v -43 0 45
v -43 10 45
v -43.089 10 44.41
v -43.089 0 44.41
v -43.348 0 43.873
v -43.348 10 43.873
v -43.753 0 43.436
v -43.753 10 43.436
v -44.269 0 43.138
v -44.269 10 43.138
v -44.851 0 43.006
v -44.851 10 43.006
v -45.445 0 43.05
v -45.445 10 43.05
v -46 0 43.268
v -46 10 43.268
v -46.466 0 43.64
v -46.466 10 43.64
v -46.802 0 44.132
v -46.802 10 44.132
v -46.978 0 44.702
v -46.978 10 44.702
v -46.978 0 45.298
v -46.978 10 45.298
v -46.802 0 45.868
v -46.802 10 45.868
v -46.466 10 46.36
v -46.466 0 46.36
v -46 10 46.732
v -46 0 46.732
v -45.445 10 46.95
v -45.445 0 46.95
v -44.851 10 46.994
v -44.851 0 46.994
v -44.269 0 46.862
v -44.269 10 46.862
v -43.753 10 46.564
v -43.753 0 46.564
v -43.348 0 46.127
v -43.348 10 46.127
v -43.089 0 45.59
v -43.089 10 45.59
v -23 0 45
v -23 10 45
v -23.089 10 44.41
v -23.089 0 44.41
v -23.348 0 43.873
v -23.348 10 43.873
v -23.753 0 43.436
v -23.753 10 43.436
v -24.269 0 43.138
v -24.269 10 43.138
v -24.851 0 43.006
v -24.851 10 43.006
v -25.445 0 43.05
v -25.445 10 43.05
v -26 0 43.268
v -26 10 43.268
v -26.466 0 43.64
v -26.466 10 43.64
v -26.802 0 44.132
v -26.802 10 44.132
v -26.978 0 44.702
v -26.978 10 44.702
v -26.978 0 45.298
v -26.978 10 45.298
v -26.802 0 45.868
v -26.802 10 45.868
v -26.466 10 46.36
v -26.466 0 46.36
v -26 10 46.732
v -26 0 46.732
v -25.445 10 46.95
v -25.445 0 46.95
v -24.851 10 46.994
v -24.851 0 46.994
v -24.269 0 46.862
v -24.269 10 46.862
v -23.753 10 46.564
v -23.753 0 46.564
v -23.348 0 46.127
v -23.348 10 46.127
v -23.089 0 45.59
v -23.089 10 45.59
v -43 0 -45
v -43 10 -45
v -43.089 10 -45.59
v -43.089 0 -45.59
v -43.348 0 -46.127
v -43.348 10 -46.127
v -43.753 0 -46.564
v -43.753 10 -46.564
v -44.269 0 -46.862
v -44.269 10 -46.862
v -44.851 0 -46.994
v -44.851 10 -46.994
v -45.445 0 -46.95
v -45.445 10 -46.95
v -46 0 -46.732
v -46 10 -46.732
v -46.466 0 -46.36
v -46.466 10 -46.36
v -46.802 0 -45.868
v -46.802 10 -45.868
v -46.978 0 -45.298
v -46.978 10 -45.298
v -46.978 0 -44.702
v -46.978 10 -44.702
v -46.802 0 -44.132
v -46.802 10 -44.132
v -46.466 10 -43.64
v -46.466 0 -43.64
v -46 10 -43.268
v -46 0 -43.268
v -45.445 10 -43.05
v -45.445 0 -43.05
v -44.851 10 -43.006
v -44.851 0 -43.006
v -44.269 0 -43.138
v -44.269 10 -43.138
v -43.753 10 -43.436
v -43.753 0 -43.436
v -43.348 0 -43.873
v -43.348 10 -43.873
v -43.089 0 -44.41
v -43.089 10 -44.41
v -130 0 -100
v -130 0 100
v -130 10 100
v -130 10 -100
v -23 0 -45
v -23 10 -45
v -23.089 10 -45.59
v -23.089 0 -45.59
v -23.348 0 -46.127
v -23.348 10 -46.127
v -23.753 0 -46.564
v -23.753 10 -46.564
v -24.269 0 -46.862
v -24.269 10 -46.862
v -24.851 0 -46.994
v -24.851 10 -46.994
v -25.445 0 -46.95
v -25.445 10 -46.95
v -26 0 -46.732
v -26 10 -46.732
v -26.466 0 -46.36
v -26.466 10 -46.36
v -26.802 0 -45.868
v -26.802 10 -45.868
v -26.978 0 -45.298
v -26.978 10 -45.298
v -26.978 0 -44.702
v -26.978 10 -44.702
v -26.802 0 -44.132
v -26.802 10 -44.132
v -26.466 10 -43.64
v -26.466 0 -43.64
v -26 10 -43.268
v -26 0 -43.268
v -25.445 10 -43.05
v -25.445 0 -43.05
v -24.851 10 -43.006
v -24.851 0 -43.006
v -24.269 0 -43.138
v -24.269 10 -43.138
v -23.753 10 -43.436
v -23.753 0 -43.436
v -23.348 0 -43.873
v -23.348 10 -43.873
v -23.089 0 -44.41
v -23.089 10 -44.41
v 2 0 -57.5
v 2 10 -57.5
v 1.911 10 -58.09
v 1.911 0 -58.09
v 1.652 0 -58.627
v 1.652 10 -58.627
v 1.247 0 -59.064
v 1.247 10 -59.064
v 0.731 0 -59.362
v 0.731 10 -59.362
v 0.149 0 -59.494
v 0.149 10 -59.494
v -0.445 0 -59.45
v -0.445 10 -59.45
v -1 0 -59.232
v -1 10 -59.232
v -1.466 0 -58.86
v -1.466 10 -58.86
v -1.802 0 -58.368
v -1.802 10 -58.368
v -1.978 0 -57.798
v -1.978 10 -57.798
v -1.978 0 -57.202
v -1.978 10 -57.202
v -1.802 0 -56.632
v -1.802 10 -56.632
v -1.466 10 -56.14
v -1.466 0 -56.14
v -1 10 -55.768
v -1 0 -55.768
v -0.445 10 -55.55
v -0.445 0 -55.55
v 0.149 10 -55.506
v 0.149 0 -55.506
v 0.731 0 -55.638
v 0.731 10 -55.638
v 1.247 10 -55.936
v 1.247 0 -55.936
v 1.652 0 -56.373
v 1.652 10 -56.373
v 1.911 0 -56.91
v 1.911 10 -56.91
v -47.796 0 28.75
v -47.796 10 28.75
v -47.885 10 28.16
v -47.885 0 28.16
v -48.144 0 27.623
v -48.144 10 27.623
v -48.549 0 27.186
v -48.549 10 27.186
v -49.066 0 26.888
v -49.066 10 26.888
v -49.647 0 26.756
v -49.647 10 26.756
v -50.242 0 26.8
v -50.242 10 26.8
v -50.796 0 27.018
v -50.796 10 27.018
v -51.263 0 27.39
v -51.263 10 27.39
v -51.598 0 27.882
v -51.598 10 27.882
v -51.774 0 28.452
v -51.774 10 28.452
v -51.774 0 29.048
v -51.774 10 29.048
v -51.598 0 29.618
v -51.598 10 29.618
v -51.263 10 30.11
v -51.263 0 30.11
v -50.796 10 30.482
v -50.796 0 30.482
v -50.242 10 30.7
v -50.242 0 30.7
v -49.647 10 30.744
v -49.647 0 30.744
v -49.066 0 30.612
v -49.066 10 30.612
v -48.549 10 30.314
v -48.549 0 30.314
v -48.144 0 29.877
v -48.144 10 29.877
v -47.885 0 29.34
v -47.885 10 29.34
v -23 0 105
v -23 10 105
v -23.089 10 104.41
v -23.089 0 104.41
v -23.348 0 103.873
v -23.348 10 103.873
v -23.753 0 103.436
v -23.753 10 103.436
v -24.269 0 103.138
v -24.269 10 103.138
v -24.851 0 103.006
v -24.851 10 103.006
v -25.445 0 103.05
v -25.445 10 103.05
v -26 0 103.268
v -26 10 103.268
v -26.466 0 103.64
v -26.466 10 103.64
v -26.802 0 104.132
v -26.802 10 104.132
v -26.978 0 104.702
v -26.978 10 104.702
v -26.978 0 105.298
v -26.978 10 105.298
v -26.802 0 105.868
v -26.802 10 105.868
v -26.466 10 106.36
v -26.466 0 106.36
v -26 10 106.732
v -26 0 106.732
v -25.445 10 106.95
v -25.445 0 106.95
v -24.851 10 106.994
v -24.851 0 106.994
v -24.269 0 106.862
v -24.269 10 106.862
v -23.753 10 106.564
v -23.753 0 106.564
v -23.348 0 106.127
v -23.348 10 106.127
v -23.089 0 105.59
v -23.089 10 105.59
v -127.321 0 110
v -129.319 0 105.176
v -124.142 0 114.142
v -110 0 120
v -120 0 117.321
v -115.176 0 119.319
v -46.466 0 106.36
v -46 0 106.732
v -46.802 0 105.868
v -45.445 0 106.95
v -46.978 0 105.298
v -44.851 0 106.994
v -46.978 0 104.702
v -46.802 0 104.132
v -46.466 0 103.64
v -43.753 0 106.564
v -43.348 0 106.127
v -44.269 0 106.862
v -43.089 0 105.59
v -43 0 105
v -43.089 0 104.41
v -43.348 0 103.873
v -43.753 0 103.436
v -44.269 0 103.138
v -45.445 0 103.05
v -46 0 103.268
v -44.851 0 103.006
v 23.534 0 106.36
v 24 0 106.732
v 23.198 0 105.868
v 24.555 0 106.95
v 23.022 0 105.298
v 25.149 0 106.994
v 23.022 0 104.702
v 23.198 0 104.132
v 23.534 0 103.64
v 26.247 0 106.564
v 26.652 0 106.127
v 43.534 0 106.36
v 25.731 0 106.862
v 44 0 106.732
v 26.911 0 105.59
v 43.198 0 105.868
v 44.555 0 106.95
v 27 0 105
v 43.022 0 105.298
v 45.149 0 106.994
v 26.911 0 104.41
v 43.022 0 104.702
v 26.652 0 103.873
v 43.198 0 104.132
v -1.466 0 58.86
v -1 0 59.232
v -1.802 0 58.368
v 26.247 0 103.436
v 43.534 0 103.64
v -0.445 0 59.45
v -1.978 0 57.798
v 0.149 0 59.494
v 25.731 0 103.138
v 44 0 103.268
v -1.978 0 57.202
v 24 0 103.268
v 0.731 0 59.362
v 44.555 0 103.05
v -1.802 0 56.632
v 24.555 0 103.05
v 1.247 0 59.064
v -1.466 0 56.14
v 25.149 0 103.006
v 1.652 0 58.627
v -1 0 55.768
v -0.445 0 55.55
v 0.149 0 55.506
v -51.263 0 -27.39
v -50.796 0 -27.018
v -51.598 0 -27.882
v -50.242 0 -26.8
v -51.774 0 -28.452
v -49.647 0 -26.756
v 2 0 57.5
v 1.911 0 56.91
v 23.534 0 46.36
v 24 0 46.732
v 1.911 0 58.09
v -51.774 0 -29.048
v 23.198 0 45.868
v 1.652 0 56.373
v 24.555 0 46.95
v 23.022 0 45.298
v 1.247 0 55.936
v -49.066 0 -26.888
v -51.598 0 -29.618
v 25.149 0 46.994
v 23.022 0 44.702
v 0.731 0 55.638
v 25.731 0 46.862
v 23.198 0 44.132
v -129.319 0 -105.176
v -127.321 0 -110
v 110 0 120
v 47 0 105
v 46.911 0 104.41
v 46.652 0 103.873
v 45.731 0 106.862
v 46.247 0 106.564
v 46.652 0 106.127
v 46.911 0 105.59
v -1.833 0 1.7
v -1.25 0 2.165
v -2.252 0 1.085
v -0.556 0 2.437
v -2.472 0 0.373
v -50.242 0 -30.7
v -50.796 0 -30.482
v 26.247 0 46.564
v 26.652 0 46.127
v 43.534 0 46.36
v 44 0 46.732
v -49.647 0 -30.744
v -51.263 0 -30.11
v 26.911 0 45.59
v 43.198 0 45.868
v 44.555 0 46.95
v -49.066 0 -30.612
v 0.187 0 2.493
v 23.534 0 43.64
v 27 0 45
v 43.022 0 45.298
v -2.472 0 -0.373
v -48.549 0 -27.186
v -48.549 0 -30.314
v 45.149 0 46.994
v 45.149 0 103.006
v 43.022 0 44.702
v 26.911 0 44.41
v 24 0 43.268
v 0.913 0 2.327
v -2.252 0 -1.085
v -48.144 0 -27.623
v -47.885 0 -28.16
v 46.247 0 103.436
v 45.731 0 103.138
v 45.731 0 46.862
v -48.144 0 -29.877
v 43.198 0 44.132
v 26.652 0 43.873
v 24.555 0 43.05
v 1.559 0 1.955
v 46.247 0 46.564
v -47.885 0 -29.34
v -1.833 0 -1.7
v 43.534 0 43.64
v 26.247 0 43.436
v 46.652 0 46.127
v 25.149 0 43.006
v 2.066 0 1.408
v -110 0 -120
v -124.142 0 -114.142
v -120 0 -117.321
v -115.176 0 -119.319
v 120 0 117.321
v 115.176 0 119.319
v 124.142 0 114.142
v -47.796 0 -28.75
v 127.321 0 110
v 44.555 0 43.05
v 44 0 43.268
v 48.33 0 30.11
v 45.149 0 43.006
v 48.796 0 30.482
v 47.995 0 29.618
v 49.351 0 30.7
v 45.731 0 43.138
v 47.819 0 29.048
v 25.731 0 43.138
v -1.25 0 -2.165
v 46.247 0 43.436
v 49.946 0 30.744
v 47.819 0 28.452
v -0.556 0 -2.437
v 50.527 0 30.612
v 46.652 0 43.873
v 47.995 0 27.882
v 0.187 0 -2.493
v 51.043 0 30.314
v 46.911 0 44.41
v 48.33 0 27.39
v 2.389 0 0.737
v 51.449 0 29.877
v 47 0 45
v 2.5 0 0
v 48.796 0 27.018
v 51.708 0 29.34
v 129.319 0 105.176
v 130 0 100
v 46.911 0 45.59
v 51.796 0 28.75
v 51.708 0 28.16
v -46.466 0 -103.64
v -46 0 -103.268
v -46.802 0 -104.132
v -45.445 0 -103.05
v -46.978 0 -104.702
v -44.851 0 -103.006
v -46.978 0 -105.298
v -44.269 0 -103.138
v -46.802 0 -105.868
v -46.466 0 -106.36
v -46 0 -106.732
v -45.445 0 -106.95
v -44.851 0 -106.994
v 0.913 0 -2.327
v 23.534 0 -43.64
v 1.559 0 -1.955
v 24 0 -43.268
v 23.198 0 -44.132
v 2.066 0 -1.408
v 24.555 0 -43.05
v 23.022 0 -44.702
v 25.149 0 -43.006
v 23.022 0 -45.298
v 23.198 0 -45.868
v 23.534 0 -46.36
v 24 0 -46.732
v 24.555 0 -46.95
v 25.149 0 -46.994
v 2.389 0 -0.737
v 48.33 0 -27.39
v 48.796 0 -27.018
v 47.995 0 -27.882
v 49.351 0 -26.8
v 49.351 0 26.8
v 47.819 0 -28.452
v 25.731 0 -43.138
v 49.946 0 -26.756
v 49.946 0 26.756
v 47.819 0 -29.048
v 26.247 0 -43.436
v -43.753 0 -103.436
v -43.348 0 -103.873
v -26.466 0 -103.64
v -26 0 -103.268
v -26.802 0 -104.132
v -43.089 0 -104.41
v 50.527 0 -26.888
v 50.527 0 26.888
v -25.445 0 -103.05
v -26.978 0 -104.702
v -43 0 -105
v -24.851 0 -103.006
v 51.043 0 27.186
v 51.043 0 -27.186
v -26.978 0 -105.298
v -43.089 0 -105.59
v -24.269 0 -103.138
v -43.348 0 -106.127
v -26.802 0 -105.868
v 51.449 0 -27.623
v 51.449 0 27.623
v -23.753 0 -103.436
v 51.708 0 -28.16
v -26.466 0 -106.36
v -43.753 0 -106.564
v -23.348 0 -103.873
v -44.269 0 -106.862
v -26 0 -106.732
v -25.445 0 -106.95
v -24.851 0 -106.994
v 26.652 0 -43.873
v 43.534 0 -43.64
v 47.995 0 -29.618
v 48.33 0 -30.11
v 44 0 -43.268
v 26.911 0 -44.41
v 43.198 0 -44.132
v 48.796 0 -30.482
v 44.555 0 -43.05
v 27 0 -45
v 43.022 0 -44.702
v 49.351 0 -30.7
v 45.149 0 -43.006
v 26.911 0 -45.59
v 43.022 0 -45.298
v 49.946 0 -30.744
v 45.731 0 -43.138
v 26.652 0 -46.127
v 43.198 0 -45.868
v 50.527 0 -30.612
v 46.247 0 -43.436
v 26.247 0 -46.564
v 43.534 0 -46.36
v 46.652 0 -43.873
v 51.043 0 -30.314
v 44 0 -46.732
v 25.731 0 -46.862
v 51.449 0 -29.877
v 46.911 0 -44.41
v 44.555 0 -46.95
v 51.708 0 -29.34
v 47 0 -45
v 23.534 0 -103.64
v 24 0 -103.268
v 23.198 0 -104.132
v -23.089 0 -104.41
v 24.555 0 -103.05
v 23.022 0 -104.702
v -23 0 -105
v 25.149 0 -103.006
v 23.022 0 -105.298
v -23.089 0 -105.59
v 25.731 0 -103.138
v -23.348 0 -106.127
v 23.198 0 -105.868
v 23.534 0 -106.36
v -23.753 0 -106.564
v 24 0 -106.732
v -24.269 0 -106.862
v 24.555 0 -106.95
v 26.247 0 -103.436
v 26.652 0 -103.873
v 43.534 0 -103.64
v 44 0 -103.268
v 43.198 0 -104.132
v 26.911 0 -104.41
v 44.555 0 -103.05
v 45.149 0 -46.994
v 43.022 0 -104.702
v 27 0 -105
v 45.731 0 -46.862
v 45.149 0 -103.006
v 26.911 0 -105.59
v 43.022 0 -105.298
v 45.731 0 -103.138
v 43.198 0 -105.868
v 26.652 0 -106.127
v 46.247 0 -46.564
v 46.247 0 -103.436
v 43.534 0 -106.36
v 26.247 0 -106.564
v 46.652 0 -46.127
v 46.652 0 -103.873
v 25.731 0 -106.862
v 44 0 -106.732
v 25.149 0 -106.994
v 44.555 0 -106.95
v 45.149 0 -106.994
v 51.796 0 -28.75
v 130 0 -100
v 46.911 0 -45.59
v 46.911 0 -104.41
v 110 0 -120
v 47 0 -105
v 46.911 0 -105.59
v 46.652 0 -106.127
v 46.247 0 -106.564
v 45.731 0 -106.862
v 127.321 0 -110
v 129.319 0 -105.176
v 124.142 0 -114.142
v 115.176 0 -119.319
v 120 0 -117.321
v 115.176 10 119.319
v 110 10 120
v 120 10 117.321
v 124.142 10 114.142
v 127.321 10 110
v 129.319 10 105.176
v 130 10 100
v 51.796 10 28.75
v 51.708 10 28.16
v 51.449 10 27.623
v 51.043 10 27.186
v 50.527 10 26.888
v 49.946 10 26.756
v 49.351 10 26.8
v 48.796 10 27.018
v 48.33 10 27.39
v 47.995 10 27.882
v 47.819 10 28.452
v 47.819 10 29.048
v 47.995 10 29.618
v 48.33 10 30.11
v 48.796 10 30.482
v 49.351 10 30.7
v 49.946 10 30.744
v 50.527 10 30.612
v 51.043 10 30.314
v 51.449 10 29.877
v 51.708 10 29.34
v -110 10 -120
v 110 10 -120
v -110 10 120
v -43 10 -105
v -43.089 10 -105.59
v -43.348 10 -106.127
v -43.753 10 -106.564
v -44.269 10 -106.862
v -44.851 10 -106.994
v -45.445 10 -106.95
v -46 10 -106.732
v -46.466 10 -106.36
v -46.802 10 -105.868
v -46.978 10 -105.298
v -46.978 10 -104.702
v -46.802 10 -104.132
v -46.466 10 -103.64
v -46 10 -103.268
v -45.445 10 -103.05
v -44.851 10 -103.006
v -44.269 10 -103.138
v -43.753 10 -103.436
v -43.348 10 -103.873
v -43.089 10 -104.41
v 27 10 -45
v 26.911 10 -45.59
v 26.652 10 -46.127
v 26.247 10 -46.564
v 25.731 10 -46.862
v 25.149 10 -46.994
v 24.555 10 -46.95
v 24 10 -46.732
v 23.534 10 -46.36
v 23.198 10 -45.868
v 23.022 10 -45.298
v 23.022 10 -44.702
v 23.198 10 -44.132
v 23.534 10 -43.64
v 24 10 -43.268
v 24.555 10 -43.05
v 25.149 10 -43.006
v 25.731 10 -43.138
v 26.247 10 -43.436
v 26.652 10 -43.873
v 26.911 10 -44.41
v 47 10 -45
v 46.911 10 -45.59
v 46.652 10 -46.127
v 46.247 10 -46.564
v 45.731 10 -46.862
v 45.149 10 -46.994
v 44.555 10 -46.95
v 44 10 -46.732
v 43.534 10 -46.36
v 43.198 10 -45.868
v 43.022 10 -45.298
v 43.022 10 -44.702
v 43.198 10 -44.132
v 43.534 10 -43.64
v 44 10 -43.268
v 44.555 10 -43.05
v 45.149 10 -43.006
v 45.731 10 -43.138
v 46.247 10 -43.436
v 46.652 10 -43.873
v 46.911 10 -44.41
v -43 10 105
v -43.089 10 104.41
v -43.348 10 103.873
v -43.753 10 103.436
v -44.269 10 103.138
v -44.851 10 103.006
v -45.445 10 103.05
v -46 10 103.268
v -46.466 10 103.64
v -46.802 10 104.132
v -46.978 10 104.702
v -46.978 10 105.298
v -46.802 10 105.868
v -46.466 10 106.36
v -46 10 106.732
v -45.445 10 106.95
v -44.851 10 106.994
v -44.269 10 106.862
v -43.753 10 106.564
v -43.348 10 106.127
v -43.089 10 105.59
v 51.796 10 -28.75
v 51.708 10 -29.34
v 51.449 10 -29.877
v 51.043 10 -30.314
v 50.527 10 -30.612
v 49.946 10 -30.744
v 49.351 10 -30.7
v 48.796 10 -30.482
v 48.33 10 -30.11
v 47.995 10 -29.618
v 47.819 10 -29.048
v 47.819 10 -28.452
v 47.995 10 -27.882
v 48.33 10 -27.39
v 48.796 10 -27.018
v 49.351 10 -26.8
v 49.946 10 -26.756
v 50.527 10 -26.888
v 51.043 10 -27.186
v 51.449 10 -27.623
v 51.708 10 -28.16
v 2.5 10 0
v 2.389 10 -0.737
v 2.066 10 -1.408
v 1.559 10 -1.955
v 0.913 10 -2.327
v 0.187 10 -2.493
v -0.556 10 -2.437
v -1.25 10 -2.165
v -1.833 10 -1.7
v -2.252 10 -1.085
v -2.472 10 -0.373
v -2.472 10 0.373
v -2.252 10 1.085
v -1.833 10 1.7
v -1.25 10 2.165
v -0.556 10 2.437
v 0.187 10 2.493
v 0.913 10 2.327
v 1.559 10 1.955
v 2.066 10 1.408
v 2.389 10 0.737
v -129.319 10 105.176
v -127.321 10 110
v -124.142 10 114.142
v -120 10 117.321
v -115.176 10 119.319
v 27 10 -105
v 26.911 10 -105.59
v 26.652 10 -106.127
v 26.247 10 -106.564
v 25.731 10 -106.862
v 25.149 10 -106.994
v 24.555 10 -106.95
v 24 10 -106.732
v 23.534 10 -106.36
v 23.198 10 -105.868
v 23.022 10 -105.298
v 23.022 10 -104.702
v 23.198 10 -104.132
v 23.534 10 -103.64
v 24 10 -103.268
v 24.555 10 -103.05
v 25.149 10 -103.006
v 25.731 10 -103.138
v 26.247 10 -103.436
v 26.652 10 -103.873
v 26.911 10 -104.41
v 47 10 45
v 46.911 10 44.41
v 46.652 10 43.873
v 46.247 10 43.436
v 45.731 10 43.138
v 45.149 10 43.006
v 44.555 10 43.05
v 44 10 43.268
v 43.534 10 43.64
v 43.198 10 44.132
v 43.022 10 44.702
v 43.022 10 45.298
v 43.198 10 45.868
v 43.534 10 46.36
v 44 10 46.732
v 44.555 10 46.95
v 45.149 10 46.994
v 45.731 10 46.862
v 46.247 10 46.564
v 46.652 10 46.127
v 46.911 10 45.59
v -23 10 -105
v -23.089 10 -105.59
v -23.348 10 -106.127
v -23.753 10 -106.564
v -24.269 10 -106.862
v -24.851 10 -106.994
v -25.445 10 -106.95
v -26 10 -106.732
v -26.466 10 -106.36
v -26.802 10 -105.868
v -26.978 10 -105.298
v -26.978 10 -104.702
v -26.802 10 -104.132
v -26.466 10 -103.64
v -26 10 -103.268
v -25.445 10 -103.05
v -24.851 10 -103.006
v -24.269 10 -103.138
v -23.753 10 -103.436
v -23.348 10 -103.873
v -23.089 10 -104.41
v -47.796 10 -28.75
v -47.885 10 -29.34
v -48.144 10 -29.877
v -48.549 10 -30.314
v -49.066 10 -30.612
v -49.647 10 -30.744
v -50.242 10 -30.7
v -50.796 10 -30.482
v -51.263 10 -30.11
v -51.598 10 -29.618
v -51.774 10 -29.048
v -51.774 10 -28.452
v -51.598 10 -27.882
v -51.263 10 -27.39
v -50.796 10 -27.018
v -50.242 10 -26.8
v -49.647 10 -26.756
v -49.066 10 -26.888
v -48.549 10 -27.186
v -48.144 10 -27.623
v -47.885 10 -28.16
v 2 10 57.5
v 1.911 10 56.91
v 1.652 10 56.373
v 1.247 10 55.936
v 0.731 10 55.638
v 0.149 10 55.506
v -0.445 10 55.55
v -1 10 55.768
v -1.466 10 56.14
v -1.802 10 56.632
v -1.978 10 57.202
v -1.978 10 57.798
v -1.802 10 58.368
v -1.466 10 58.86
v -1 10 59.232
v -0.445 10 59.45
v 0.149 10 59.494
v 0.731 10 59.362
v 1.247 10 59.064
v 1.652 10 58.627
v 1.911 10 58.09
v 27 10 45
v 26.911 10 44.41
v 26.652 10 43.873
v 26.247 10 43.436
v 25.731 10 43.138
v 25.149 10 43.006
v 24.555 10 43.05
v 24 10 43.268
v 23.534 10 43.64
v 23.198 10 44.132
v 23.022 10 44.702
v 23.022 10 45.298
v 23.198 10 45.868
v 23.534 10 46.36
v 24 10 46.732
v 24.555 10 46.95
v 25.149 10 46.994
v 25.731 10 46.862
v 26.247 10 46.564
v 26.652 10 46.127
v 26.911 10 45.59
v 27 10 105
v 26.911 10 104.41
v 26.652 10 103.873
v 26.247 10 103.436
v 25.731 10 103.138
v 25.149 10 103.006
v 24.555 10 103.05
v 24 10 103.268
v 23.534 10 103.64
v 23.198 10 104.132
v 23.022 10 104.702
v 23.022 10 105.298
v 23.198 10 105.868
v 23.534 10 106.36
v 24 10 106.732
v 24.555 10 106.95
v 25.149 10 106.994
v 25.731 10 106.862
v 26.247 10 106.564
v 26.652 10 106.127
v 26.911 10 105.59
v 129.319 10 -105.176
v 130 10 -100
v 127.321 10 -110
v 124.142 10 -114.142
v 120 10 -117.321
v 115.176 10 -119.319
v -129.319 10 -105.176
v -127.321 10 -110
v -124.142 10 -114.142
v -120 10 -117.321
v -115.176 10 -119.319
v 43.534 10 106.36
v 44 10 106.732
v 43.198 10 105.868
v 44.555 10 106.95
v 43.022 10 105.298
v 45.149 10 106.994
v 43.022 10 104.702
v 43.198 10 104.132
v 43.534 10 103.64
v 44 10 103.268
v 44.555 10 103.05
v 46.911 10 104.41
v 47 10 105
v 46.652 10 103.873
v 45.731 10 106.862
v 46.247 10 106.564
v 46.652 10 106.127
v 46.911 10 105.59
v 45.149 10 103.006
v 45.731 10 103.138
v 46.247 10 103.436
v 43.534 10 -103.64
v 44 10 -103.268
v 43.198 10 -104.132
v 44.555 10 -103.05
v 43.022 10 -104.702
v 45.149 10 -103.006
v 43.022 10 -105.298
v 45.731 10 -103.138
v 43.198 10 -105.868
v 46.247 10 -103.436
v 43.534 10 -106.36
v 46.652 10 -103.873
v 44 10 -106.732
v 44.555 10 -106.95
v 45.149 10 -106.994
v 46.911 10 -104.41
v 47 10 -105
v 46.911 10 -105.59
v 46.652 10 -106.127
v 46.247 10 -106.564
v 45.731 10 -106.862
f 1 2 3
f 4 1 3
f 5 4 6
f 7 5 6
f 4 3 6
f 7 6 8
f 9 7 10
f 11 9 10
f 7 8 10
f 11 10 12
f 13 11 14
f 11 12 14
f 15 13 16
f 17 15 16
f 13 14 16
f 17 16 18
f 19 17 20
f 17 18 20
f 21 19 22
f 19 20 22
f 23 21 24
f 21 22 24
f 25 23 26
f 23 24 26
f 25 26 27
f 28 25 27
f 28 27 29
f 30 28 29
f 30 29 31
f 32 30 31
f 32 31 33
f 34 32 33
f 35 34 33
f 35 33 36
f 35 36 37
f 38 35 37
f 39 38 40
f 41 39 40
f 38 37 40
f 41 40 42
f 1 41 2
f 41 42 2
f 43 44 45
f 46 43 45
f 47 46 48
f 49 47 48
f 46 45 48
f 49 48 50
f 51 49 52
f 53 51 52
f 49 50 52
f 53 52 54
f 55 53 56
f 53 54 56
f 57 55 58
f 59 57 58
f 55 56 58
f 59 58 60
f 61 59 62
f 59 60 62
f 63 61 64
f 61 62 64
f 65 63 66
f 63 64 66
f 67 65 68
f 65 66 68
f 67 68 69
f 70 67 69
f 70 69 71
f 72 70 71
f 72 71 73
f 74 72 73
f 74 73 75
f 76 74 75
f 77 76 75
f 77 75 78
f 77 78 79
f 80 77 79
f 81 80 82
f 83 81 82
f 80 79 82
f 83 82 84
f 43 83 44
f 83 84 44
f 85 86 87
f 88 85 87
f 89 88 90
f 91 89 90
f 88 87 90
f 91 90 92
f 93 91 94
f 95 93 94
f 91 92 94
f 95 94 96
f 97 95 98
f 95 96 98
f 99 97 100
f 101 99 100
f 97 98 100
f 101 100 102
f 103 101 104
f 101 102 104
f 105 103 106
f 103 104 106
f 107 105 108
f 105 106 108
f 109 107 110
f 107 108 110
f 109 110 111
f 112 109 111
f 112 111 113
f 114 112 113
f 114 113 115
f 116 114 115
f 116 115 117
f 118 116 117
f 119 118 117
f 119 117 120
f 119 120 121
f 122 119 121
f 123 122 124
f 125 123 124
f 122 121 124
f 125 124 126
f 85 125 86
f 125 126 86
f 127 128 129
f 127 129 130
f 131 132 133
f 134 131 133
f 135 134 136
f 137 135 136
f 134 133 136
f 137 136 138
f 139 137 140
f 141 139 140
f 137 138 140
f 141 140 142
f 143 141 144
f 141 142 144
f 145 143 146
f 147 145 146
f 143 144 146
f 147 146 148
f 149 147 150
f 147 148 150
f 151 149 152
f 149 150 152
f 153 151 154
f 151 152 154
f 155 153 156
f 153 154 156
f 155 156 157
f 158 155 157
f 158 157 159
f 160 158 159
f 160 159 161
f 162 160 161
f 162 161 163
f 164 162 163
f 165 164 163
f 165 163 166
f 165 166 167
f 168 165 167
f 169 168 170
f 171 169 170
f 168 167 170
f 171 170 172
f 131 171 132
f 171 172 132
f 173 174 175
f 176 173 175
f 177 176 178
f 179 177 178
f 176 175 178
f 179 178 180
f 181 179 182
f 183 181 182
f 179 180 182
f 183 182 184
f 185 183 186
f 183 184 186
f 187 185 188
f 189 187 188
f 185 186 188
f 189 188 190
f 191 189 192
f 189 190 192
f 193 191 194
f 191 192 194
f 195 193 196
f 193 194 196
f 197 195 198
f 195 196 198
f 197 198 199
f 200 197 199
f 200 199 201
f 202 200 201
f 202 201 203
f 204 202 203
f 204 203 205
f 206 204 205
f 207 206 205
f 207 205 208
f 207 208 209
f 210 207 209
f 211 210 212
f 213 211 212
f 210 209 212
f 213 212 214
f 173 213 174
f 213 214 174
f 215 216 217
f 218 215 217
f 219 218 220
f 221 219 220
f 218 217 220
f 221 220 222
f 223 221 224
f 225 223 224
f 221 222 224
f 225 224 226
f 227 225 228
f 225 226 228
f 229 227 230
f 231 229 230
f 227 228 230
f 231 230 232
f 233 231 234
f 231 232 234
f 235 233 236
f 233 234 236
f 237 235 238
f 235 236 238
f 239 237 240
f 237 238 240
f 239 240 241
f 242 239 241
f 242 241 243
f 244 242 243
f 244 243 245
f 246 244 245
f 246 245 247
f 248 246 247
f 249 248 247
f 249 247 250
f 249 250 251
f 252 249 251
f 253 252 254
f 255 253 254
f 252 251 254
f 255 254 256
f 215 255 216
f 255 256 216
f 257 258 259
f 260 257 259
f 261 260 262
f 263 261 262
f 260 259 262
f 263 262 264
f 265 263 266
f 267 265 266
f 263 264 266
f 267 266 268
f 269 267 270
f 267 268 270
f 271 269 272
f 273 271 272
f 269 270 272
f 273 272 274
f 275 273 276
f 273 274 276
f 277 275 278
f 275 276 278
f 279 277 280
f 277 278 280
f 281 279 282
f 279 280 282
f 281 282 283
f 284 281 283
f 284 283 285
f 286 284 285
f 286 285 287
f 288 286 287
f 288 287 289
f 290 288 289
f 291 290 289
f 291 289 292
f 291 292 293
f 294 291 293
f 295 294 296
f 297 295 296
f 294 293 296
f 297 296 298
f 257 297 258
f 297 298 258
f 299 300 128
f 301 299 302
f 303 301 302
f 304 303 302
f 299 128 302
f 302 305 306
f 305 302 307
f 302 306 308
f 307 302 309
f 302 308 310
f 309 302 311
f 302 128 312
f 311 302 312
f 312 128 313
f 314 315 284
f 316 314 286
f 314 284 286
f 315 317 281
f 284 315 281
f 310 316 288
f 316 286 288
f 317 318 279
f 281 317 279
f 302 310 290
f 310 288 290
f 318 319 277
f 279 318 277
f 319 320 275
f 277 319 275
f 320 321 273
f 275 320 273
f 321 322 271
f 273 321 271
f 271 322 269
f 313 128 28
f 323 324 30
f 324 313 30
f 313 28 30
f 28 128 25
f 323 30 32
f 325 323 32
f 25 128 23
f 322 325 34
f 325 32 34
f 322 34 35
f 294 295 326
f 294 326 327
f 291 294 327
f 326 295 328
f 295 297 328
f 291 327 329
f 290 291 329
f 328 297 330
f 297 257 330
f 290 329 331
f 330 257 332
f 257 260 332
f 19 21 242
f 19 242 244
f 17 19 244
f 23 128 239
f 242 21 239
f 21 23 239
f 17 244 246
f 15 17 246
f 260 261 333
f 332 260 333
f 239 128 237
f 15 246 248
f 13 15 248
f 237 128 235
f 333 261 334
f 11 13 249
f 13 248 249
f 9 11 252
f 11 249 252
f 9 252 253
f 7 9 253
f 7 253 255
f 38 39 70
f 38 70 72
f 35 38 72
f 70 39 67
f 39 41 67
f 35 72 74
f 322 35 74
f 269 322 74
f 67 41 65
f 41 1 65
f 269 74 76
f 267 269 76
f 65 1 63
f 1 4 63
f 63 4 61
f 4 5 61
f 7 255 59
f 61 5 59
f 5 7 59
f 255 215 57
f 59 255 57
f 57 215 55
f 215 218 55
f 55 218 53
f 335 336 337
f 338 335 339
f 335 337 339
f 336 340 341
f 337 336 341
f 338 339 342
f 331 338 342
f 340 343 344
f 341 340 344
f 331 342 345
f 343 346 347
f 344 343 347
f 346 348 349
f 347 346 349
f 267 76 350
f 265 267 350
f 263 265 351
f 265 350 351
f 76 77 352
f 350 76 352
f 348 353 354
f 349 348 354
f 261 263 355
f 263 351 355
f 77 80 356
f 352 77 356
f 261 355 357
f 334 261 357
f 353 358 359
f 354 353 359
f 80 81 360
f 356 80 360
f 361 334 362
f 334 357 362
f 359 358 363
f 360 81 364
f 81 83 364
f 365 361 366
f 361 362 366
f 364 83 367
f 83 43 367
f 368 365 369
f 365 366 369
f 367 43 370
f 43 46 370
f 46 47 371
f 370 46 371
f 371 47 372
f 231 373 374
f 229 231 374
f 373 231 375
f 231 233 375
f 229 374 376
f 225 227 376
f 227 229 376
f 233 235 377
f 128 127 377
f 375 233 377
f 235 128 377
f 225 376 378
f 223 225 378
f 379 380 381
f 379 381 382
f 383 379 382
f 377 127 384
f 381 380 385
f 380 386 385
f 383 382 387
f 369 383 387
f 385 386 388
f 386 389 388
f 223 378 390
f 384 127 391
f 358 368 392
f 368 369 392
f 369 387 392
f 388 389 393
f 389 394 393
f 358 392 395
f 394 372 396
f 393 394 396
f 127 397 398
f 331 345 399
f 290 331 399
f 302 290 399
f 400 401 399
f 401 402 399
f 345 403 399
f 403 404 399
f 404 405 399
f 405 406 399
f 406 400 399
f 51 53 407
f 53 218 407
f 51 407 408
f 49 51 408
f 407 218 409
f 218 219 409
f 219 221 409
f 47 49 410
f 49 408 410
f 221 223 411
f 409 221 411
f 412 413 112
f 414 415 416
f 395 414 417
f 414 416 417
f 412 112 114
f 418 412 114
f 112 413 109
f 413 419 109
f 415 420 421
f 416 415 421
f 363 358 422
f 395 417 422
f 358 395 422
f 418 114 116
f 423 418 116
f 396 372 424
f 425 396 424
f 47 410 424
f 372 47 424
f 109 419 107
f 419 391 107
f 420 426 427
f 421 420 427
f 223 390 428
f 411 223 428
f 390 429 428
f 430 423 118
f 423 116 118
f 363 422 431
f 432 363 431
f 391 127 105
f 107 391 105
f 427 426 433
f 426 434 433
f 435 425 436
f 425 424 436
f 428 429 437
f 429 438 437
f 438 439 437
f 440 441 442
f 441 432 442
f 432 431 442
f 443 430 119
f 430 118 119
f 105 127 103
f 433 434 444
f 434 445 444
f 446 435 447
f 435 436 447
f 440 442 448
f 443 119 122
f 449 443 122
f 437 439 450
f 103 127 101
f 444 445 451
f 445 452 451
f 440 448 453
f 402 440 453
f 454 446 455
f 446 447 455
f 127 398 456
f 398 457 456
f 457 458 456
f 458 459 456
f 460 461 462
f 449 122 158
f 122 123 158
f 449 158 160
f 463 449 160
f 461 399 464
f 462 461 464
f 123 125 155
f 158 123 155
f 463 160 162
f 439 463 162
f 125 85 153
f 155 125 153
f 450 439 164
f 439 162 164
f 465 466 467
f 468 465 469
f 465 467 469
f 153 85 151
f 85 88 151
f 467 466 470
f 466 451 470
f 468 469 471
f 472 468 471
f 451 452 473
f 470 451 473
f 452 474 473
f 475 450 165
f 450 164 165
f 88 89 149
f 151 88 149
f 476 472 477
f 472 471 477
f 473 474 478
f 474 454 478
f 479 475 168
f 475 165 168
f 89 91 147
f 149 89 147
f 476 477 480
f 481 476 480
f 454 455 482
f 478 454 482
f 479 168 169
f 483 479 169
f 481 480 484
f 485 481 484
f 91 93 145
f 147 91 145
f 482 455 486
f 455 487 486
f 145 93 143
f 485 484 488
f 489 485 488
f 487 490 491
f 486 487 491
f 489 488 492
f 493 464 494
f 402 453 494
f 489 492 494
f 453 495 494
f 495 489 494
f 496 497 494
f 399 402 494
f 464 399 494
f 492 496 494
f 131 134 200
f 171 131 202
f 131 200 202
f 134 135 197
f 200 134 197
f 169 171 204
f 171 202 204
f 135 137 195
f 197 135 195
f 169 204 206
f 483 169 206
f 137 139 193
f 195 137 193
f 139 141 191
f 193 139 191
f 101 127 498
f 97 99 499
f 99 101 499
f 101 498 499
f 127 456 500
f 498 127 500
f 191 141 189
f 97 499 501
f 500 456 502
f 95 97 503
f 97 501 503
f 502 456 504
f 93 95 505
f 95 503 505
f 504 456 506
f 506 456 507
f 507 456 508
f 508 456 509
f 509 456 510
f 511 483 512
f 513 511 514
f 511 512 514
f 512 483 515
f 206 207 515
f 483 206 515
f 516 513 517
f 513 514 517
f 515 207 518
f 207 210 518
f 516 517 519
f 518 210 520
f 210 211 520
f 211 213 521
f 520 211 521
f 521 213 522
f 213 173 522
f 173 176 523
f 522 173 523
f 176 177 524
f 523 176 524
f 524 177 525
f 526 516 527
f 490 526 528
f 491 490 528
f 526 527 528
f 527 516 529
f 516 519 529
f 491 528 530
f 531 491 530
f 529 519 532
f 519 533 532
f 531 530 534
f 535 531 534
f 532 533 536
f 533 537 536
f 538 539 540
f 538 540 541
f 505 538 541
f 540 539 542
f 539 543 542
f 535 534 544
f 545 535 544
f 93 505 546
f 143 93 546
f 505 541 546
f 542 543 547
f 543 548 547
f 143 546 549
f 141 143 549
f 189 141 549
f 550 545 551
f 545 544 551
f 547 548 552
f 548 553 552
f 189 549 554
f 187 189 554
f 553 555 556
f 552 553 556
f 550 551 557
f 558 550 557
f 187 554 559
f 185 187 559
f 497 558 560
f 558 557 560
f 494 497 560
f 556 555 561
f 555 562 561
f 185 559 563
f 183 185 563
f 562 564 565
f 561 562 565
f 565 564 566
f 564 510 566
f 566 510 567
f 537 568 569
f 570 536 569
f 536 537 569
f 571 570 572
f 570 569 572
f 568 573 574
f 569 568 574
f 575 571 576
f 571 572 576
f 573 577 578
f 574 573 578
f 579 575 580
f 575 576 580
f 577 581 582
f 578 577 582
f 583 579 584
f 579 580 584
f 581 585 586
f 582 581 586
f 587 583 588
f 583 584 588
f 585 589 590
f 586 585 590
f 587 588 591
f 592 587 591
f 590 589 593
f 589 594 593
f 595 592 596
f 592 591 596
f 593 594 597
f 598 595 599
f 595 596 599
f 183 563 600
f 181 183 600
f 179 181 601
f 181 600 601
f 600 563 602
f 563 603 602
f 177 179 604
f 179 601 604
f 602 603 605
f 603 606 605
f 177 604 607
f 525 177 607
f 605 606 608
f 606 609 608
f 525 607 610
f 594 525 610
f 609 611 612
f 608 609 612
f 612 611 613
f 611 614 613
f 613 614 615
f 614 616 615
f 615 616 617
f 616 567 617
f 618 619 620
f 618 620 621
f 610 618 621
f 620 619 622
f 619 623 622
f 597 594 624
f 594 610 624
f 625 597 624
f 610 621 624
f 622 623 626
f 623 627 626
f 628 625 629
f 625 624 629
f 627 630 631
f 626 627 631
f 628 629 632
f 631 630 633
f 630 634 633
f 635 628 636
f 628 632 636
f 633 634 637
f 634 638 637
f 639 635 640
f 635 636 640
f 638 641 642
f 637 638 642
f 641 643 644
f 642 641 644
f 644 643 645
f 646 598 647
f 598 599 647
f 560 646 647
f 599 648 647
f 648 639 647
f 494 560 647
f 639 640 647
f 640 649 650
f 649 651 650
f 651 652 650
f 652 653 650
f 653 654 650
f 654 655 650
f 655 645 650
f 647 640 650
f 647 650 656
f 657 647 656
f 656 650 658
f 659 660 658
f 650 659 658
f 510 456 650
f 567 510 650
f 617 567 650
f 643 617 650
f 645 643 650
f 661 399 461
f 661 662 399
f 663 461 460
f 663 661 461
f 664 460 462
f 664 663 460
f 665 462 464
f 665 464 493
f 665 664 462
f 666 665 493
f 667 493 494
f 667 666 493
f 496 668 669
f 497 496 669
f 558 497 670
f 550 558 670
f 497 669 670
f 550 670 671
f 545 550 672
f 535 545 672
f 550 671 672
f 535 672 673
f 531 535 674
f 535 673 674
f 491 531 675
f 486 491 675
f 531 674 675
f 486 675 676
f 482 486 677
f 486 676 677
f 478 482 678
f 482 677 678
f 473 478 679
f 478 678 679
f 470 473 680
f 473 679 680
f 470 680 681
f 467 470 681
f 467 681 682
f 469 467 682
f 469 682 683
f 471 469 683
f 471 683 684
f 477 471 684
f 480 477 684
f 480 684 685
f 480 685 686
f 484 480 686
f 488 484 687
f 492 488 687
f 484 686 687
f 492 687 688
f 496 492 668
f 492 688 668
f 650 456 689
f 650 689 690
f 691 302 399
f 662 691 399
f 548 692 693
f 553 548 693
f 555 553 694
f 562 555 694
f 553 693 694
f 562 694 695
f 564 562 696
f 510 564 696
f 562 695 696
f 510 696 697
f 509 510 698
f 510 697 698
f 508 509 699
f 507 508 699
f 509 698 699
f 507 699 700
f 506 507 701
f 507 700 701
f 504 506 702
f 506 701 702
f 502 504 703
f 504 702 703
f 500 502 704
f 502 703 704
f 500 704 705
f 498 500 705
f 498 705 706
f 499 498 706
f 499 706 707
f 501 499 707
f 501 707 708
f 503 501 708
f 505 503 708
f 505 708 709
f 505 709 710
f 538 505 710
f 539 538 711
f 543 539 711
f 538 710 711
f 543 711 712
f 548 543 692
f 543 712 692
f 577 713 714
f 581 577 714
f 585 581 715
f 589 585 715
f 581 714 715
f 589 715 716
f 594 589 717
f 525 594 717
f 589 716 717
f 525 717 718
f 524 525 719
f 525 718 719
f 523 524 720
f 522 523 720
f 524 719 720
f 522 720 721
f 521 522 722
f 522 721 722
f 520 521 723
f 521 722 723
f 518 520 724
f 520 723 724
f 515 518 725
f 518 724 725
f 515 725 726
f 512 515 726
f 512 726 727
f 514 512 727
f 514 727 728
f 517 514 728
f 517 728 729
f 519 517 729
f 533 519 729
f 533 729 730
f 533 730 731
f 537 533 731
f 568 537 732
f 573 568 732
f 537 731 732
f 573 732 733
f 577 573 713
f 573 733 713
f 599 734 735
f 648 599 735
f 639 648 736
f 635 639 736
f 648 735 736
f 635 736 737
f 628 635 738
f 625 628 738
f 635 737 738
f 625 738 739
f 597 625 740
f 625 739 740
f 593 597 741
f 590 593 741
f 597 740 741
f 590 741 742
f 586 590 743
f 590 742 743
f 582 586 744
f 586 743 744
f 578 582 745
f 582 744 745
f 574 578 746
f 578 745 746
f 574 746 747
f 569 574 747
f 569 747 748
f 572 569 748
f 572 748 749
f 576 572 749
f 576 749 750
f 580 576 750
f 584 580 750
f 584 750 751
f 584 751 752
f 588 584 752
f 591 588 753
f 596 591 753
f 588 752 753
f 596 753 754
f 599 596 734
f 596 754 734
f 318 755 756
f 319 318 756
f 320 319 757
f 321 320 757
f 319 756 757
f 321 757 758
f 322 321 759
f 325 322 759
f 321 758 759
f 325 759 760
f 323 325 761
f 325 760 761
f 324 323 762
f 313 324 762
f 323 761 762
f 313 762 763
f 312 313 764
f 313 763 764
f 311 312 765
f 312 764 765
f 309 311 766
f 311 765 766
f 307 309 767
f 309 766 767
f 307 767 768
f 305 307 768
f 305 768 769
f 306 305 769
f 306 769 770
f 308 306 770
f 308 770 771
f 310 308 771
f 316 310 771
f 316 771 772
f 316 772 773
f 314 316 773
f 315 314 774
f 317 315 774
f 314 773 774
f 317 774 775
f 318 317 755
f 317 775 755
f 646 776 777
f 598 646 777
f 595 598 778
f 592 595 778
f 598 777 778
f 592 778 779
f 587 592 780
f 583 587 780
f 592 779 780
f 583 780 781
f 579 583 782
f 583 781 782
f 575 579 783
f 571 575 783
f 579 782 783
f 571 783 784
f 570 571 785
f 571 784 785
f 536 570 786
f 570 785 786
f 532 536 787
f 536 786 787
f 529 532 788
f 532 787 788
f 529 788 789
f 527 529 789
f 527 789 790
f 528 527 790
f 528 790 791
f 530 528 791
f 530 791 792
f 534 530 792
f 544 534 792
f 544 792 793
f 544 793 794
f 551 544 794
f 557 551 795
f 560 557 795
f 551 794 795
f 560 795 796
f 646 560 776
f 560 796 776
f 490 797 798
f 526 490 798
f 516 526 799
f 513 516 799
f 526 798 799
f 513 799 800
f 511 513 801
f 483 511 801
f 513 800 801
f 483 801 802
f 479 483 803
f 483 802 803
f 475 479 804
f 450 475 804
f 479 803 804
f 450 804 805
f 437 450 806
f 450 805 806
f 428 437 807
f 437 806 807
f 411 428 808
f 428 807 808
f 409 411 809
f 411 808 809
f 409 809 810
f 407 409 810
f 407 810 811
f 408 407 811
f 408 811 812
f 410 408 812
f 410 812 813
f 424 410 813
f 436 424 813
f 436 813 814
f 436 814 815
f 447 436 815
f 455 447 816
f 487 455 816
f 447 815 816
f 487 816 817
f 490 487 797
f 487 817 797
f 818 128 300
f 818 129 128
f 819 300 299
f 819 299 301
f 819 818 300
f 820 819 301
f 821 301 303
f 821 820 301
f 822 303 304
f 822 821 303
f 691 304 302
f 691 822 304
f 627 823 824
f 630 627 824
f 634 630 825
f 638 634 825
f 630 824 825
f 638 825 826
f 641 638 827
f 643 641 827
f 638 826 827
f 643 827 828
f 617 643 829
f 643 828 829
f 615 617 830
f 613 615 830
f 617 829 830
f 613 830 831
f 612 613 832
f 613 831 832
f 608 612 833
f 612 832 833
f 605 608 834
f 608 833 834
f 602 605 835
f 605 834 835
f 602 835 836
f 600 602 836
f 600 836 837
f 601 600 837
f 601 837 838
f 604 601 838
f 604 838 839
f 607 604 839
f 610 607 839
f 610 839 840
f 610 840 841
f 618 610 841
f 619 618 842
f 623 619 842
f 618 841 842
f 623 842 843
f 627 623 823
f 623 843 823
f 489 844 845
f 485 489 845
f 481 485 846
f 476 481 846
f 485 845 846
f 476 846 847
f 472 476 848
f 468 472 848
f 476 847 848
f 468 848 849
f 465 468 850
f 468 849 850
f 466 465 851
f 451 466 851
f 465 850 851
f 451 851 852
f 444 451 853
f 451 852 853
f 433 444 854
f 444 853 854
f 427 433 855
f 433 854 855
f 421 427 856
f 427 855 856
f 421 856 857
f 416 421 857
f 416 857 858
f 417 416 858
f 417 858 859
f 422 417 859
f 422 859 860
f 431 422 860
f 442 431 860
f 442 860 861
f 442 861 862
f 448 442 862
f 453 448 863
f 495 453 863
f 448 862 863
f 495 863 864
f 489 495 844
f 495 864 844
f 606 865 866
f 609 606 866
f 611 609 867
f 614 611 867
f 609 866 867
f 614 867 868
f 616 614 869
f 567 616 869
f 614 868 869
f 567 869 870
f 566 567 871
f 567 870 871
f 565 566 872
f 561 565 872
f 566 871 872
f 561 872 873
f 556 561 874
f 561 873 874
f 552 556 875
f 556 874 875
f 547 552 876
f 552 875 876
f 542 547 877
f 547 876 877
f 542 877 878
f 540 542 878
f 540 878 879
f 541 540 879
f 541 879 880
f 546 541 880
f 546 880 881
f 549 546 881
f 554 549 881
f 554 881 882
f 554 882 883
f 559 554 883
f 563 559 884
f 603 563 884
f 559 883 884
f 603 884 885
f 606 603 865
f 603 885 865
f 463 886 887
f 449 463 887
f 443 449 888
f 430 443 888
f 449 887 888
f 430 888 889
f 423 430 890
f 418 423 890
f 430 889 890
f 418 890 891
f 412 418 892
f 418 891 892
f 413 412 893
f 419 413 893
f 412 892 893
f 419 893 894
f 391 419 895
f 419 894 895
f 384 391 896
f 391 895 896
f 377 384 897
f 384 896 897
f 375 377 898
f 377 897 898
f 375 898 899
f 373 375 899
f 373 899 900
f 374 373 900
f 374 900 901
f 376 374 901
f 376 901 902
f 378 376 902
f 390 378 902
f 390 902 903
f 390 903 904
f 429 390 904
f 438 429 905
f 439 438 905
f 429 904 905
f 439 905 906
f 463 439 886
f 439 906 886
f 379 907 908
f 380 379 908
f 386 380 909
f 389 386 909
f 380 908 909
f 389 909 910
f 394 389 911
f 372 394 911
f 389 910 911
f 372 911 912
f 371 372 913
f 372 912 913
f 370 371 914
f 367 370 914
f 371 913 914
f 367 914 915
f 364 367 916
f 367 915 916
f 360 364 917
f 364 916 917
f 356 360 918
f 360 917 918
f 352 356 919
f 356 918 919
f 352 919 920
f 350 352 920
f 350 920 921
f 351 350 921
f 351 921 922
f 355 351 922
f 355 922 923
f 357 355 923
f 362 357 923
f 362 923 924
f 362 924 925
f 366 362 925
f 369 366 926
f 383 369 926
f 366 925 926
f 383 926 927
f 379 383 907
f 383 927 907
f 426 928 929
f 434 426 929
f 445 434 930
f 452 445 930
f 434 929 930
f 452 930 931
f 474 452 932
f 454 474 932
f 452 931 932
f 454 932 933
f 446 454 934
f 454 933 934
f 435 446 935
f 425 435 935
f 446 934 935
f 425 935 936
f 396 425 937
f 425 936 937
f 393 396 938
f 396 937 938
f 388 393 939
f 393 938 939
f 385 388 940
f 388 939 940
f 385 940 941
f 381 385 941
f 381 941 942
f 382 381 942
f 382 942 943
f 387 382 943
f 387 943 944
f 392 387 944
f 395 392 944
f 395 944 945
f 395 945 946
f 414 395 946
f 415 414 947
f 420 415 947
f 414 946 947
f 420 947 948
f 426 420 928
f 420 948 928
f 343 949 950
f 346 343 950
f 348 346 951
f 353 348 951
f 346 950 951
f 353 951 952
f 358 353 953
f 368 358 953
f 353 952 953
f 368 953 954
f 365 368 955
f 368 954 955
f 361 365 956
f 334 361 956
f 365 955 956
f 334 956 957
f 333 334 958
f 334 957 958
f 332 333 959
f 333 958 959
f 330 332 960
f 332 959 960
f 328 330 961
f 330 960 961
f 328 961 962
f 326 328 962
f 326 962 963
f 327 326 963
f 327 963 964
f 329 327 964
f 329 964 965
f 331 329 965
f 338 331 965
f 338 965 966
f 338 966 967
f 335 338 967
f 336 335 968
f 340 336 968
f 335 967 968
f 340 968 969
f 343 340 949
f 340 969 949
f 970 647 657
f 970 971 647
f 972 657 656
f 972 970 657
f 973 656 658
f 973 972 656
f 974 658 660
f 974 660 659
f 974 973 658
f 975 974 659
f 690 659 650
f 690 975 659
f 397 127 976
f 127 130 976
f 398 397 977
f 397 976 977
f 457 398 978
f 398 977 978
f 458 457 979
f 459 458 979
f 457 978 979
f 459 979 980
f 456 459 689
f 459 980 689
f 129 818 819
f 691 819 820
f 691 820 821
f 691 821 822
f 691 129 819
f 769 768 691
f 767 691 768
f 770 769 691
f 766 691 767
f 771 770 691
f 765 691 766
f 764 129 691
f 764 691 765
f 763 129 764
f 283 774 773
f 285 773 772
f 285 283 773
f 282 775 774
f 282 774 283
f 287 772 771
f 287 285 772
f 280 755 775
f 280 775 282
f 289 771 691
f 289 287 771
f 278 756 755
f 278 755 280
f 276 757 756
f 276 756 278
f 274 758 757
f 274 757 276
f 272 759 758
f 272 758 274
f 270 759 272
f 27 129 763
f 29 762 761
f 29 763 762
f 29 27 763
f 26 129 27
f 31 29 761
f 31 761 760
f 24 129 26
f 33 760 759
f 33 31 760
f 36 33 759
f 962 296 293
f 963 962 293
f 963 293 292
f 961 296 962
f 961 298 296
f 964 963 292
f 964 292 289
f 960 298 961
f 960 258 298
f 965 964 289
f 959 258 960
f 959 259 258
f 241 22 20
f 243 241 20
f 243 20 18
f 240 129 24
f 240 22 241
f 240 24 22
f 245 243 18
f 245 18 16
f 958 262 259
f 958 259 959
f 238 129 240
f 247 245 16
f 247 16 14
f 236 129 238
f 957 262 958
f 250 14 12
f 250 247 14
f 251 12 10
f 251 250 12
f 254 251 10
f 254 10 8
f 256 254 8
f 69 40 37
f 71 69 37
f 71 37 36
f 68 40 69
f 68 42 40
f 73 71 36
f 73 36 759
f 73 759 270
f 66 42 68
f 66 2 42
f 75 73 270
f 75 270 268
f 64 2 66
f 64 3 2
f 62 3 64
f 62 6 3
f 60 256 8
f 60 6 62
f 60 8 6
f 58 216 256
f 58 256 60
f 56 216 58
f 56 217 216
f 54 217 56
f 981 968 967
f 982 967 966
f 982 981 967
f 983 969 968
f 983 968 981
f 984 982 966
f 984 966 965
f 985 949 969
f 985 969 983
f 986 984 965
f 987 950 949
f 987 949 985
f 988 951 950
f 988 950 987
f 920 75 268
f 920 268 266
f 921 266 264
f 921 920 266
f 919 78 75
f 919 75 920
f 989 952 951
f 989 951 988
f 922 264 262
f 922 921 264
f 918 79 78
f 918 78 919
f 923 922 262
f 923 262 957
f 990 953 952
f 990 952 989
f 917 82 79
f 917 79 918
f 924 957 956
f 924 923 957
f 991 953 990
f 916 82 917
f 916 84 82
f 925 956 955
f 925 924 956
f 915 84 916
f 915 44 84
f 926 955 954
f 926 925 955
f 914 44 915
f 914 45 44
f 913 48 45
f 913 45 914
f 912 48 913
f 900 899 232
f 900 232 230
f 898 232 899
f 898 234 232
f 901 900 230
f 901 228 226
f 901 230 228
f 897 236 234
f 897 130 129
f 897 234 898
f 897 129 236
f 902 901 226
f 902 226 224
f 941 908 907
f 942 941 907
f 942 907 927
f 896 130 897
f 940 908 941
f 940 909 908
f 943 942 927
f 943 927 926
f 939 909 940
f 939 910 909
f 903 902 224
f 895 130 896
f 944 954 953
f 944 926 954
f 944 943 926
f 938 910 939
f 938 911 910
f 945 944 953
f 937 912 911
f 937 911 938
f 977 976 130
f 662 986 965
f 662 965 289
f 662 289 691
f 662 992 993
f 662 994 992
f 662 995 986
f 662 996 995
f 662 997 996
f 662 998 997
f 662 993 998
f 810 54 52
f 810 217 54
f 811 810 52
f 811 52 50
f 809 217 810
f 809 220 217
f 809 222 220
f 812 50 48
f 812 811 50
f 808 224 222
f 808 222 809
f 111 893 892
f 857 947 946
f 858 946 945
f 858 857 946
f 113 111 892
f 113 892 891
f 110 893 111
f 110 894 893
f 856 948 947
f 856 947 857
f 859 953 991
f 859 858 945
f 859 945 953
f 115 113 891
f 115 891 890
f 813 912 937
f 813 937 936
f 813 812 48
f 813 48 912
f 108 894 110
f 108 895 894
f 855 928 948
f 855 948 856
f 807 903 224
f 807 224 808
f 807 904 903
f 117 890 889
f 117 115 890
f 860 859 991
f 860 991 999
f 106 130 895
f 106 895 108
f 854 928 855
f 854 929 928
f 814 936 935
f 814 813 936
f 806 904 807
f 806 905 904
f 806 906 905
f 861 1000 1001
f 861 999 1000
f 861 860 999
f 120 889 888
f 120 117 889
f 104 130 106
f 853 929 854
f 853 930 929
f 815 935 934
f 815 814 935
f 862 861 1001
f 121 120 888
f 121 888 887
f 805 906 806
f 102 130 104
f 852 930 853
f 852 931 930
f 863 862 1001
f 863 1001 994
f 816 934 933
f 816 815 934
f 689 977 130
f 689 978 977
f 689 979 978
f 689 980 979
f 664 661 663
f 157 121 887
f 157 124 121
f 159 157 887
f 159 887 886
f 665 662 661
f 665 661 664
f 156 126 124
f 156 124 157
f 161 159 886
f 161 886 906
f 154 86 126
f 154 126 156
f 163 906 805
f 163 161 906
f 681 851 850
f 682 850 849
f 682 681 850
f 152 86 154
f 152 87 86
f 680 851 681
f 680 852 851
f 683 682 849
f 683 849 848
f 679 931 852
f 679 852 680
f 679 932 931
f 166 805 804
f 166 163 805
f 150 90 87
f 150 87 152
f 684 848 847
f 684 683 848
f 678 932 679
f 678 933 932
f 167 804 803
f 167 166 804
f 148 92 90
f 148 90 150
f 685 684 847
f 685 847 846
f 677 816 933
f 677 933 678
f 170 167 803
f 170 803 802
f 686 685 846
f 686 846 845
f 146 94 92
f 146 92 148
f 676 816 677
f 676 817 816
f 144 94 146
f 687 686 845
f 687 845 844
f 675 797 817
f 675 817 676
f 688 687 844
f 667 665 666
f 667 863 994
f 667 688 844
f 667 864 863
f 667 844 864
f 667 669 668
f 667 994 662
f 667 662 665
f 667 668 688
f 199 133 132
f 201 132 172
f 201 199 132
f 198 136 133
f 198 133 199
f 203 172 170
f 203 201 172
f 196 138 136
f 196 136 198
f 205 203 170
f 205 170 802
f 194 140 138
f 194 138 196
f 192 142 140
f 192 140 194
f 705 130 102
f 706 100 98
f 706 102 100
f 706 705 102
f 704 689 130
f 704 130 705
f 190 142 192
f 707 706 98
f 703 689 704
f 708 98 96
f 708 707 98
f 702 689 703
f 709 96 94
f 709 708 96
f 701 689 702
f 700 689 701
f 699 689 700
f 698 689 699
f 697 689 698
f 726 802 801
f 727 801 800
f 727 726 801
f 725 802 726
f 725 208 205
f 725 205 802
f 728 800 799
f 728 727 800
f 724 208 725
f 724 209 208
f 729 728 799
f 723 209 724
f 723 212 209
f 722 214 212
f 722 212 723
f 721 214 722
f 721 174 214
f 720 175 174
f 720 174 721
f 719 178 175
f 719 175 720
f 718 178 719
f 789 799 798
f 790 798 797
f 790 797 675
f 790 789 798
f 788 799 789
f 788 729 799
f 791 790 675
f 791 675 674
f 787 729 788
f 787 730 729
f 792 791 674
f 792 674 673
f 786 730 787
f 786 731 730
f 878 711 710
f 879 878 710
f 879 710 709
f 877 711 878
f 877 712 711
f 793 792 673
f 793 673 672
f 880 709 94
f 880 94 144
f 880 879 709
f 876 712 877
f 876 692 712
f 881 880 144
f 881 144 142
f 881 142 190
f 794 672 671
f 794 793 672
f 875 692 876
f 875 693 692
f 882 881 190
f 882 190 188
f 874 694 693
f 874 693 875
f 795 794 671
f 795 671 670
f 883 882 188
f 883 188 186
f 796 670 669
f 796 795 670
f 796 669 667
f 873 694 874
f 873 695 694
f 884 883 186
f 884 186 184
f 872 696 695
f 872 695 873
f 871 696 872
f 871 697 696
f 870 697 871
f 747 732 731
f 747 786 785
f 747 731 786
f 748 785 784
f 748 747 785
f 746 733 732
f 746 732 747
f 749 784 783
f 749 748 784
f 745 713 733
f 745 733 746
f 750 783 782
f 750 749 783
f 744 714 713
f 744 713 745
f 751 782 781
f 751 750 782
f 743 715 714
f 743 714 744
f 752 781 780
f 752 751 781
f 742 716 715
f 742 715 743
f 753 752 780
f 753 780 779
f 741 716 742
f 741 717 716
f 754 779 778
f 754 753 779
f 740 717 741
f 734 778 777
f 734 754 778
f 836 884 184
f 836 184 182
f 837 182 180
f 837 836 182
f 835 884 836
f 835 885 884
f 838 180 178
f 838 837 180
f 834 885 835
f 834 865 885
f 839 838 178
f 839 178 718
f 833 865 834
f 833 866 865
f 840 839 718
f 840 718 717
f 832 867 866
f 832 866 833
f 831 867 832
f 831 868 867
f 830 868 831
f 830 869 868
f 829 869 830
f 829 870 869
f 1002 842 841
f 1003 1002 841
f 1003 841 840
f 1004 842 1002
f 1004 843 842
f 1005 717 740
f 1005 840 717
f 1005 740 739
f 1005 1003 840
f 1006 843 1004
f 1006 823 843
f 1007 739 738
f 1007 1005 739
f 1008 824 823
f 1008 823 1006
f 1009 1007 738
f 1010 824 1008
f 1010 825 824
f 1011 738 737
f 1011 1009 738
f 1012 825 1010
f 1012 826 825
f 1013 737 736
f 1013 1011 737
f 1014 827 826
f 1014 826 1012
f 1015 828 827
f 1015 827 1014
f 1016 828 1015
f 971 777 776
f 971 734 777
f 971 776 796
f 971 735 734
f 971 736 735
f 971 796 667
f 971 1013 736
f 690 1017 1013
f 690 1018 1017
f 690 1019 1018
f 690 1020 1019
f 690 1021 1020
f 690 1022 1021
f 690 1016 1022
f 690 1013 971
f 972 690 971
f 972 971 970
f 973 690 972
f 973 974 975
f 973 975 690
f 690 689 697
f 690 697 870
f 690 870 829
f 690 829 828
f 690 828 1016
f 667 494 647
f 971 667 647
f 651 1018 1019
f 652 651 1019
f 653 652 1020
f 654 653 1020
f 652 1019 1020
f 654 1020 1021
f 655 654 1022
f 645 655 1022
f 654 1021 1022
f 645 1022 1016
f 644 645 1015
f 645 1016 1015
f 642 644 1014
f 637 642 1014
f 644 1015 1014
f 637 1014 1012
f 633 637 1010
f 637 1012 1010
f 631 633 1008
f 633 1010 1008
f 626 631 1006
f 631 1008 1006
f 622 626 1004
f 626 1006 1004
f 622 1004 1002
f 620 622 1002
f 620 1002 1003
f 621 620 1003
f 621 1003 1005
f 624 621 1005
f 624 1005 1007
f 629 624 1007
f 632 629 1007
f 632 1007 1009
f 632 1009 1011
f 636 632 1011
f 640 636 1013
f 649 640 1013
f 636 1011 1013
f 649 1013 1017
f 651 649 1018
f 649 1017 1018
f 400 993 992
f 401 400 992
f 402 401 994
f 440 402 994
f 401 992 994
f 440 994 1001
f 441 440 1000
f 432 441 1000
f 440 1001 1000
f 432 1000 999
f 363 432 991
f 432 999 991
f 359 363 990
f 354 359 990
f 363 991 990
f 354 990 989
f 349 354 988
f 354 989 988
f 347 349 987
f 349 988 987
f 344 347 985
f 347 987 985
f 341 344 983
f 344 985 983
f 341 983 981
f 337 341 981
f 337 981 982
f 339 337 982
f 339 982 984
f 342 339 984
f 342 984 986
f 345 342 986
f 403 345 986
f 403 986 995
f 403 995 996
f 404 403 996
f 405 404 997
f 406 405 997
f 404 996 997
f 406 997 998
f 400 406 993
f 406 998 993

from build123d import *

# Parameters (mm, degrees)
SKETCH1_W           = 260
SKETCH1_H           = 240
BOSS_EXTRUDE1_DEPTH = 10
FILLET3_R           = 20
SKETCH3_R           = 2.5
SKETCH3_R_2         = 2
CUT_EXTRUDE2_DEPTH  = 10


with BuildPart() as part:
    # Sketch1 → Boss-Extrude1 (new body)
    with BuildSketch(Plane(origin=(0, 0, 0), x_dir=(1, 0, 0), z_dir=(0, 1, 0))):
        Rectangle(SKETCH1_W, SKETCH1_H)
    extrude(amount=BOSS_EXTRUDE1_DEPTH)

    # Fillet3
    fillet3_edges = [part.edges().sort_by_distance(p)[0] for p in [
        (130, 5, 120),
        (-130, 5, 120),
        (-130, 5, -120),
        (130, 5, -120),
    ]]
    fillet(fillet3_edges, radius=FILLET3_R)

    # Sketch3 → Cut-Extrude2 (cut)
    with BuildSketch(Plane(origin=(0, 10, 0), x_dir=(1, 0, 0), z_dir=(0, 1, 0))):
        Circle(SKETCH3_R)
        with Locations((0, 57.5)):
            Circle(SKETCH3_R_2)
        with Locations((45, 45)):
            Circle(SKETCH3_R_2)
        with Locations((-45, 45)):
            Circle(SKETCH3_R_2)
        with Locations((45, 105)):
            Circle(SKETCH3_R_2)
        with Locations((-45, 105)):
            Circle(SKETCH3_R_2)
        with Locations((25, 105)):
            Circle(SKETCH3_R_2)
        with Locations((-25, 105)):
            Circle(SKETCH3_R_2)
        with Locations((0, -57.5)):
            Circle(SKETCH3_R_2)
        with Locations((49.796460718, -28.75)):
            Circle(SKETCH3_R_2)
        with Locations((49.796460718, 28.75)):
            Circle(SKETCH3_R_2)
        with Locations((45, -105)):
            Circle(SKETCH3_R_2)
        with Locations((45, -45)):
            Circle(SKETCH3_R_2)
        with Locations((25, -45)):
            Circle(SKETCH3_R_2)
        with Locations((-25, -45)):
            Circle(SKETCH3_R_2)
        with Locations((-45, -45)):
            Circle(SKETCH3_R_2)
        with Locations((25, 45)):
            Circle(SKETCH3_R_2)
        with Locations((-25, 45)):
            Circle(SKETCH3_R_2)
        with Locations((-49.796460718, -28.75)):
            Circle(SKETCH3_R_2)
        with Locations((-45, -105)):
            Circle(SKETCH3_R_2)
        with Locations((-25, -105)):
            Circle(SKETCH3_R_2)
        with Locations((25, -105)):
            Circle(SKETCH3_R_2)
        with Locations((-49.796460718, 28.75)):
            Circle(SKETCH3_R_2)
    extrude(amount=-CUT_EXTRUDE2_DEPTH, mode=Mode.SUBTRACT)


solid = part.part
